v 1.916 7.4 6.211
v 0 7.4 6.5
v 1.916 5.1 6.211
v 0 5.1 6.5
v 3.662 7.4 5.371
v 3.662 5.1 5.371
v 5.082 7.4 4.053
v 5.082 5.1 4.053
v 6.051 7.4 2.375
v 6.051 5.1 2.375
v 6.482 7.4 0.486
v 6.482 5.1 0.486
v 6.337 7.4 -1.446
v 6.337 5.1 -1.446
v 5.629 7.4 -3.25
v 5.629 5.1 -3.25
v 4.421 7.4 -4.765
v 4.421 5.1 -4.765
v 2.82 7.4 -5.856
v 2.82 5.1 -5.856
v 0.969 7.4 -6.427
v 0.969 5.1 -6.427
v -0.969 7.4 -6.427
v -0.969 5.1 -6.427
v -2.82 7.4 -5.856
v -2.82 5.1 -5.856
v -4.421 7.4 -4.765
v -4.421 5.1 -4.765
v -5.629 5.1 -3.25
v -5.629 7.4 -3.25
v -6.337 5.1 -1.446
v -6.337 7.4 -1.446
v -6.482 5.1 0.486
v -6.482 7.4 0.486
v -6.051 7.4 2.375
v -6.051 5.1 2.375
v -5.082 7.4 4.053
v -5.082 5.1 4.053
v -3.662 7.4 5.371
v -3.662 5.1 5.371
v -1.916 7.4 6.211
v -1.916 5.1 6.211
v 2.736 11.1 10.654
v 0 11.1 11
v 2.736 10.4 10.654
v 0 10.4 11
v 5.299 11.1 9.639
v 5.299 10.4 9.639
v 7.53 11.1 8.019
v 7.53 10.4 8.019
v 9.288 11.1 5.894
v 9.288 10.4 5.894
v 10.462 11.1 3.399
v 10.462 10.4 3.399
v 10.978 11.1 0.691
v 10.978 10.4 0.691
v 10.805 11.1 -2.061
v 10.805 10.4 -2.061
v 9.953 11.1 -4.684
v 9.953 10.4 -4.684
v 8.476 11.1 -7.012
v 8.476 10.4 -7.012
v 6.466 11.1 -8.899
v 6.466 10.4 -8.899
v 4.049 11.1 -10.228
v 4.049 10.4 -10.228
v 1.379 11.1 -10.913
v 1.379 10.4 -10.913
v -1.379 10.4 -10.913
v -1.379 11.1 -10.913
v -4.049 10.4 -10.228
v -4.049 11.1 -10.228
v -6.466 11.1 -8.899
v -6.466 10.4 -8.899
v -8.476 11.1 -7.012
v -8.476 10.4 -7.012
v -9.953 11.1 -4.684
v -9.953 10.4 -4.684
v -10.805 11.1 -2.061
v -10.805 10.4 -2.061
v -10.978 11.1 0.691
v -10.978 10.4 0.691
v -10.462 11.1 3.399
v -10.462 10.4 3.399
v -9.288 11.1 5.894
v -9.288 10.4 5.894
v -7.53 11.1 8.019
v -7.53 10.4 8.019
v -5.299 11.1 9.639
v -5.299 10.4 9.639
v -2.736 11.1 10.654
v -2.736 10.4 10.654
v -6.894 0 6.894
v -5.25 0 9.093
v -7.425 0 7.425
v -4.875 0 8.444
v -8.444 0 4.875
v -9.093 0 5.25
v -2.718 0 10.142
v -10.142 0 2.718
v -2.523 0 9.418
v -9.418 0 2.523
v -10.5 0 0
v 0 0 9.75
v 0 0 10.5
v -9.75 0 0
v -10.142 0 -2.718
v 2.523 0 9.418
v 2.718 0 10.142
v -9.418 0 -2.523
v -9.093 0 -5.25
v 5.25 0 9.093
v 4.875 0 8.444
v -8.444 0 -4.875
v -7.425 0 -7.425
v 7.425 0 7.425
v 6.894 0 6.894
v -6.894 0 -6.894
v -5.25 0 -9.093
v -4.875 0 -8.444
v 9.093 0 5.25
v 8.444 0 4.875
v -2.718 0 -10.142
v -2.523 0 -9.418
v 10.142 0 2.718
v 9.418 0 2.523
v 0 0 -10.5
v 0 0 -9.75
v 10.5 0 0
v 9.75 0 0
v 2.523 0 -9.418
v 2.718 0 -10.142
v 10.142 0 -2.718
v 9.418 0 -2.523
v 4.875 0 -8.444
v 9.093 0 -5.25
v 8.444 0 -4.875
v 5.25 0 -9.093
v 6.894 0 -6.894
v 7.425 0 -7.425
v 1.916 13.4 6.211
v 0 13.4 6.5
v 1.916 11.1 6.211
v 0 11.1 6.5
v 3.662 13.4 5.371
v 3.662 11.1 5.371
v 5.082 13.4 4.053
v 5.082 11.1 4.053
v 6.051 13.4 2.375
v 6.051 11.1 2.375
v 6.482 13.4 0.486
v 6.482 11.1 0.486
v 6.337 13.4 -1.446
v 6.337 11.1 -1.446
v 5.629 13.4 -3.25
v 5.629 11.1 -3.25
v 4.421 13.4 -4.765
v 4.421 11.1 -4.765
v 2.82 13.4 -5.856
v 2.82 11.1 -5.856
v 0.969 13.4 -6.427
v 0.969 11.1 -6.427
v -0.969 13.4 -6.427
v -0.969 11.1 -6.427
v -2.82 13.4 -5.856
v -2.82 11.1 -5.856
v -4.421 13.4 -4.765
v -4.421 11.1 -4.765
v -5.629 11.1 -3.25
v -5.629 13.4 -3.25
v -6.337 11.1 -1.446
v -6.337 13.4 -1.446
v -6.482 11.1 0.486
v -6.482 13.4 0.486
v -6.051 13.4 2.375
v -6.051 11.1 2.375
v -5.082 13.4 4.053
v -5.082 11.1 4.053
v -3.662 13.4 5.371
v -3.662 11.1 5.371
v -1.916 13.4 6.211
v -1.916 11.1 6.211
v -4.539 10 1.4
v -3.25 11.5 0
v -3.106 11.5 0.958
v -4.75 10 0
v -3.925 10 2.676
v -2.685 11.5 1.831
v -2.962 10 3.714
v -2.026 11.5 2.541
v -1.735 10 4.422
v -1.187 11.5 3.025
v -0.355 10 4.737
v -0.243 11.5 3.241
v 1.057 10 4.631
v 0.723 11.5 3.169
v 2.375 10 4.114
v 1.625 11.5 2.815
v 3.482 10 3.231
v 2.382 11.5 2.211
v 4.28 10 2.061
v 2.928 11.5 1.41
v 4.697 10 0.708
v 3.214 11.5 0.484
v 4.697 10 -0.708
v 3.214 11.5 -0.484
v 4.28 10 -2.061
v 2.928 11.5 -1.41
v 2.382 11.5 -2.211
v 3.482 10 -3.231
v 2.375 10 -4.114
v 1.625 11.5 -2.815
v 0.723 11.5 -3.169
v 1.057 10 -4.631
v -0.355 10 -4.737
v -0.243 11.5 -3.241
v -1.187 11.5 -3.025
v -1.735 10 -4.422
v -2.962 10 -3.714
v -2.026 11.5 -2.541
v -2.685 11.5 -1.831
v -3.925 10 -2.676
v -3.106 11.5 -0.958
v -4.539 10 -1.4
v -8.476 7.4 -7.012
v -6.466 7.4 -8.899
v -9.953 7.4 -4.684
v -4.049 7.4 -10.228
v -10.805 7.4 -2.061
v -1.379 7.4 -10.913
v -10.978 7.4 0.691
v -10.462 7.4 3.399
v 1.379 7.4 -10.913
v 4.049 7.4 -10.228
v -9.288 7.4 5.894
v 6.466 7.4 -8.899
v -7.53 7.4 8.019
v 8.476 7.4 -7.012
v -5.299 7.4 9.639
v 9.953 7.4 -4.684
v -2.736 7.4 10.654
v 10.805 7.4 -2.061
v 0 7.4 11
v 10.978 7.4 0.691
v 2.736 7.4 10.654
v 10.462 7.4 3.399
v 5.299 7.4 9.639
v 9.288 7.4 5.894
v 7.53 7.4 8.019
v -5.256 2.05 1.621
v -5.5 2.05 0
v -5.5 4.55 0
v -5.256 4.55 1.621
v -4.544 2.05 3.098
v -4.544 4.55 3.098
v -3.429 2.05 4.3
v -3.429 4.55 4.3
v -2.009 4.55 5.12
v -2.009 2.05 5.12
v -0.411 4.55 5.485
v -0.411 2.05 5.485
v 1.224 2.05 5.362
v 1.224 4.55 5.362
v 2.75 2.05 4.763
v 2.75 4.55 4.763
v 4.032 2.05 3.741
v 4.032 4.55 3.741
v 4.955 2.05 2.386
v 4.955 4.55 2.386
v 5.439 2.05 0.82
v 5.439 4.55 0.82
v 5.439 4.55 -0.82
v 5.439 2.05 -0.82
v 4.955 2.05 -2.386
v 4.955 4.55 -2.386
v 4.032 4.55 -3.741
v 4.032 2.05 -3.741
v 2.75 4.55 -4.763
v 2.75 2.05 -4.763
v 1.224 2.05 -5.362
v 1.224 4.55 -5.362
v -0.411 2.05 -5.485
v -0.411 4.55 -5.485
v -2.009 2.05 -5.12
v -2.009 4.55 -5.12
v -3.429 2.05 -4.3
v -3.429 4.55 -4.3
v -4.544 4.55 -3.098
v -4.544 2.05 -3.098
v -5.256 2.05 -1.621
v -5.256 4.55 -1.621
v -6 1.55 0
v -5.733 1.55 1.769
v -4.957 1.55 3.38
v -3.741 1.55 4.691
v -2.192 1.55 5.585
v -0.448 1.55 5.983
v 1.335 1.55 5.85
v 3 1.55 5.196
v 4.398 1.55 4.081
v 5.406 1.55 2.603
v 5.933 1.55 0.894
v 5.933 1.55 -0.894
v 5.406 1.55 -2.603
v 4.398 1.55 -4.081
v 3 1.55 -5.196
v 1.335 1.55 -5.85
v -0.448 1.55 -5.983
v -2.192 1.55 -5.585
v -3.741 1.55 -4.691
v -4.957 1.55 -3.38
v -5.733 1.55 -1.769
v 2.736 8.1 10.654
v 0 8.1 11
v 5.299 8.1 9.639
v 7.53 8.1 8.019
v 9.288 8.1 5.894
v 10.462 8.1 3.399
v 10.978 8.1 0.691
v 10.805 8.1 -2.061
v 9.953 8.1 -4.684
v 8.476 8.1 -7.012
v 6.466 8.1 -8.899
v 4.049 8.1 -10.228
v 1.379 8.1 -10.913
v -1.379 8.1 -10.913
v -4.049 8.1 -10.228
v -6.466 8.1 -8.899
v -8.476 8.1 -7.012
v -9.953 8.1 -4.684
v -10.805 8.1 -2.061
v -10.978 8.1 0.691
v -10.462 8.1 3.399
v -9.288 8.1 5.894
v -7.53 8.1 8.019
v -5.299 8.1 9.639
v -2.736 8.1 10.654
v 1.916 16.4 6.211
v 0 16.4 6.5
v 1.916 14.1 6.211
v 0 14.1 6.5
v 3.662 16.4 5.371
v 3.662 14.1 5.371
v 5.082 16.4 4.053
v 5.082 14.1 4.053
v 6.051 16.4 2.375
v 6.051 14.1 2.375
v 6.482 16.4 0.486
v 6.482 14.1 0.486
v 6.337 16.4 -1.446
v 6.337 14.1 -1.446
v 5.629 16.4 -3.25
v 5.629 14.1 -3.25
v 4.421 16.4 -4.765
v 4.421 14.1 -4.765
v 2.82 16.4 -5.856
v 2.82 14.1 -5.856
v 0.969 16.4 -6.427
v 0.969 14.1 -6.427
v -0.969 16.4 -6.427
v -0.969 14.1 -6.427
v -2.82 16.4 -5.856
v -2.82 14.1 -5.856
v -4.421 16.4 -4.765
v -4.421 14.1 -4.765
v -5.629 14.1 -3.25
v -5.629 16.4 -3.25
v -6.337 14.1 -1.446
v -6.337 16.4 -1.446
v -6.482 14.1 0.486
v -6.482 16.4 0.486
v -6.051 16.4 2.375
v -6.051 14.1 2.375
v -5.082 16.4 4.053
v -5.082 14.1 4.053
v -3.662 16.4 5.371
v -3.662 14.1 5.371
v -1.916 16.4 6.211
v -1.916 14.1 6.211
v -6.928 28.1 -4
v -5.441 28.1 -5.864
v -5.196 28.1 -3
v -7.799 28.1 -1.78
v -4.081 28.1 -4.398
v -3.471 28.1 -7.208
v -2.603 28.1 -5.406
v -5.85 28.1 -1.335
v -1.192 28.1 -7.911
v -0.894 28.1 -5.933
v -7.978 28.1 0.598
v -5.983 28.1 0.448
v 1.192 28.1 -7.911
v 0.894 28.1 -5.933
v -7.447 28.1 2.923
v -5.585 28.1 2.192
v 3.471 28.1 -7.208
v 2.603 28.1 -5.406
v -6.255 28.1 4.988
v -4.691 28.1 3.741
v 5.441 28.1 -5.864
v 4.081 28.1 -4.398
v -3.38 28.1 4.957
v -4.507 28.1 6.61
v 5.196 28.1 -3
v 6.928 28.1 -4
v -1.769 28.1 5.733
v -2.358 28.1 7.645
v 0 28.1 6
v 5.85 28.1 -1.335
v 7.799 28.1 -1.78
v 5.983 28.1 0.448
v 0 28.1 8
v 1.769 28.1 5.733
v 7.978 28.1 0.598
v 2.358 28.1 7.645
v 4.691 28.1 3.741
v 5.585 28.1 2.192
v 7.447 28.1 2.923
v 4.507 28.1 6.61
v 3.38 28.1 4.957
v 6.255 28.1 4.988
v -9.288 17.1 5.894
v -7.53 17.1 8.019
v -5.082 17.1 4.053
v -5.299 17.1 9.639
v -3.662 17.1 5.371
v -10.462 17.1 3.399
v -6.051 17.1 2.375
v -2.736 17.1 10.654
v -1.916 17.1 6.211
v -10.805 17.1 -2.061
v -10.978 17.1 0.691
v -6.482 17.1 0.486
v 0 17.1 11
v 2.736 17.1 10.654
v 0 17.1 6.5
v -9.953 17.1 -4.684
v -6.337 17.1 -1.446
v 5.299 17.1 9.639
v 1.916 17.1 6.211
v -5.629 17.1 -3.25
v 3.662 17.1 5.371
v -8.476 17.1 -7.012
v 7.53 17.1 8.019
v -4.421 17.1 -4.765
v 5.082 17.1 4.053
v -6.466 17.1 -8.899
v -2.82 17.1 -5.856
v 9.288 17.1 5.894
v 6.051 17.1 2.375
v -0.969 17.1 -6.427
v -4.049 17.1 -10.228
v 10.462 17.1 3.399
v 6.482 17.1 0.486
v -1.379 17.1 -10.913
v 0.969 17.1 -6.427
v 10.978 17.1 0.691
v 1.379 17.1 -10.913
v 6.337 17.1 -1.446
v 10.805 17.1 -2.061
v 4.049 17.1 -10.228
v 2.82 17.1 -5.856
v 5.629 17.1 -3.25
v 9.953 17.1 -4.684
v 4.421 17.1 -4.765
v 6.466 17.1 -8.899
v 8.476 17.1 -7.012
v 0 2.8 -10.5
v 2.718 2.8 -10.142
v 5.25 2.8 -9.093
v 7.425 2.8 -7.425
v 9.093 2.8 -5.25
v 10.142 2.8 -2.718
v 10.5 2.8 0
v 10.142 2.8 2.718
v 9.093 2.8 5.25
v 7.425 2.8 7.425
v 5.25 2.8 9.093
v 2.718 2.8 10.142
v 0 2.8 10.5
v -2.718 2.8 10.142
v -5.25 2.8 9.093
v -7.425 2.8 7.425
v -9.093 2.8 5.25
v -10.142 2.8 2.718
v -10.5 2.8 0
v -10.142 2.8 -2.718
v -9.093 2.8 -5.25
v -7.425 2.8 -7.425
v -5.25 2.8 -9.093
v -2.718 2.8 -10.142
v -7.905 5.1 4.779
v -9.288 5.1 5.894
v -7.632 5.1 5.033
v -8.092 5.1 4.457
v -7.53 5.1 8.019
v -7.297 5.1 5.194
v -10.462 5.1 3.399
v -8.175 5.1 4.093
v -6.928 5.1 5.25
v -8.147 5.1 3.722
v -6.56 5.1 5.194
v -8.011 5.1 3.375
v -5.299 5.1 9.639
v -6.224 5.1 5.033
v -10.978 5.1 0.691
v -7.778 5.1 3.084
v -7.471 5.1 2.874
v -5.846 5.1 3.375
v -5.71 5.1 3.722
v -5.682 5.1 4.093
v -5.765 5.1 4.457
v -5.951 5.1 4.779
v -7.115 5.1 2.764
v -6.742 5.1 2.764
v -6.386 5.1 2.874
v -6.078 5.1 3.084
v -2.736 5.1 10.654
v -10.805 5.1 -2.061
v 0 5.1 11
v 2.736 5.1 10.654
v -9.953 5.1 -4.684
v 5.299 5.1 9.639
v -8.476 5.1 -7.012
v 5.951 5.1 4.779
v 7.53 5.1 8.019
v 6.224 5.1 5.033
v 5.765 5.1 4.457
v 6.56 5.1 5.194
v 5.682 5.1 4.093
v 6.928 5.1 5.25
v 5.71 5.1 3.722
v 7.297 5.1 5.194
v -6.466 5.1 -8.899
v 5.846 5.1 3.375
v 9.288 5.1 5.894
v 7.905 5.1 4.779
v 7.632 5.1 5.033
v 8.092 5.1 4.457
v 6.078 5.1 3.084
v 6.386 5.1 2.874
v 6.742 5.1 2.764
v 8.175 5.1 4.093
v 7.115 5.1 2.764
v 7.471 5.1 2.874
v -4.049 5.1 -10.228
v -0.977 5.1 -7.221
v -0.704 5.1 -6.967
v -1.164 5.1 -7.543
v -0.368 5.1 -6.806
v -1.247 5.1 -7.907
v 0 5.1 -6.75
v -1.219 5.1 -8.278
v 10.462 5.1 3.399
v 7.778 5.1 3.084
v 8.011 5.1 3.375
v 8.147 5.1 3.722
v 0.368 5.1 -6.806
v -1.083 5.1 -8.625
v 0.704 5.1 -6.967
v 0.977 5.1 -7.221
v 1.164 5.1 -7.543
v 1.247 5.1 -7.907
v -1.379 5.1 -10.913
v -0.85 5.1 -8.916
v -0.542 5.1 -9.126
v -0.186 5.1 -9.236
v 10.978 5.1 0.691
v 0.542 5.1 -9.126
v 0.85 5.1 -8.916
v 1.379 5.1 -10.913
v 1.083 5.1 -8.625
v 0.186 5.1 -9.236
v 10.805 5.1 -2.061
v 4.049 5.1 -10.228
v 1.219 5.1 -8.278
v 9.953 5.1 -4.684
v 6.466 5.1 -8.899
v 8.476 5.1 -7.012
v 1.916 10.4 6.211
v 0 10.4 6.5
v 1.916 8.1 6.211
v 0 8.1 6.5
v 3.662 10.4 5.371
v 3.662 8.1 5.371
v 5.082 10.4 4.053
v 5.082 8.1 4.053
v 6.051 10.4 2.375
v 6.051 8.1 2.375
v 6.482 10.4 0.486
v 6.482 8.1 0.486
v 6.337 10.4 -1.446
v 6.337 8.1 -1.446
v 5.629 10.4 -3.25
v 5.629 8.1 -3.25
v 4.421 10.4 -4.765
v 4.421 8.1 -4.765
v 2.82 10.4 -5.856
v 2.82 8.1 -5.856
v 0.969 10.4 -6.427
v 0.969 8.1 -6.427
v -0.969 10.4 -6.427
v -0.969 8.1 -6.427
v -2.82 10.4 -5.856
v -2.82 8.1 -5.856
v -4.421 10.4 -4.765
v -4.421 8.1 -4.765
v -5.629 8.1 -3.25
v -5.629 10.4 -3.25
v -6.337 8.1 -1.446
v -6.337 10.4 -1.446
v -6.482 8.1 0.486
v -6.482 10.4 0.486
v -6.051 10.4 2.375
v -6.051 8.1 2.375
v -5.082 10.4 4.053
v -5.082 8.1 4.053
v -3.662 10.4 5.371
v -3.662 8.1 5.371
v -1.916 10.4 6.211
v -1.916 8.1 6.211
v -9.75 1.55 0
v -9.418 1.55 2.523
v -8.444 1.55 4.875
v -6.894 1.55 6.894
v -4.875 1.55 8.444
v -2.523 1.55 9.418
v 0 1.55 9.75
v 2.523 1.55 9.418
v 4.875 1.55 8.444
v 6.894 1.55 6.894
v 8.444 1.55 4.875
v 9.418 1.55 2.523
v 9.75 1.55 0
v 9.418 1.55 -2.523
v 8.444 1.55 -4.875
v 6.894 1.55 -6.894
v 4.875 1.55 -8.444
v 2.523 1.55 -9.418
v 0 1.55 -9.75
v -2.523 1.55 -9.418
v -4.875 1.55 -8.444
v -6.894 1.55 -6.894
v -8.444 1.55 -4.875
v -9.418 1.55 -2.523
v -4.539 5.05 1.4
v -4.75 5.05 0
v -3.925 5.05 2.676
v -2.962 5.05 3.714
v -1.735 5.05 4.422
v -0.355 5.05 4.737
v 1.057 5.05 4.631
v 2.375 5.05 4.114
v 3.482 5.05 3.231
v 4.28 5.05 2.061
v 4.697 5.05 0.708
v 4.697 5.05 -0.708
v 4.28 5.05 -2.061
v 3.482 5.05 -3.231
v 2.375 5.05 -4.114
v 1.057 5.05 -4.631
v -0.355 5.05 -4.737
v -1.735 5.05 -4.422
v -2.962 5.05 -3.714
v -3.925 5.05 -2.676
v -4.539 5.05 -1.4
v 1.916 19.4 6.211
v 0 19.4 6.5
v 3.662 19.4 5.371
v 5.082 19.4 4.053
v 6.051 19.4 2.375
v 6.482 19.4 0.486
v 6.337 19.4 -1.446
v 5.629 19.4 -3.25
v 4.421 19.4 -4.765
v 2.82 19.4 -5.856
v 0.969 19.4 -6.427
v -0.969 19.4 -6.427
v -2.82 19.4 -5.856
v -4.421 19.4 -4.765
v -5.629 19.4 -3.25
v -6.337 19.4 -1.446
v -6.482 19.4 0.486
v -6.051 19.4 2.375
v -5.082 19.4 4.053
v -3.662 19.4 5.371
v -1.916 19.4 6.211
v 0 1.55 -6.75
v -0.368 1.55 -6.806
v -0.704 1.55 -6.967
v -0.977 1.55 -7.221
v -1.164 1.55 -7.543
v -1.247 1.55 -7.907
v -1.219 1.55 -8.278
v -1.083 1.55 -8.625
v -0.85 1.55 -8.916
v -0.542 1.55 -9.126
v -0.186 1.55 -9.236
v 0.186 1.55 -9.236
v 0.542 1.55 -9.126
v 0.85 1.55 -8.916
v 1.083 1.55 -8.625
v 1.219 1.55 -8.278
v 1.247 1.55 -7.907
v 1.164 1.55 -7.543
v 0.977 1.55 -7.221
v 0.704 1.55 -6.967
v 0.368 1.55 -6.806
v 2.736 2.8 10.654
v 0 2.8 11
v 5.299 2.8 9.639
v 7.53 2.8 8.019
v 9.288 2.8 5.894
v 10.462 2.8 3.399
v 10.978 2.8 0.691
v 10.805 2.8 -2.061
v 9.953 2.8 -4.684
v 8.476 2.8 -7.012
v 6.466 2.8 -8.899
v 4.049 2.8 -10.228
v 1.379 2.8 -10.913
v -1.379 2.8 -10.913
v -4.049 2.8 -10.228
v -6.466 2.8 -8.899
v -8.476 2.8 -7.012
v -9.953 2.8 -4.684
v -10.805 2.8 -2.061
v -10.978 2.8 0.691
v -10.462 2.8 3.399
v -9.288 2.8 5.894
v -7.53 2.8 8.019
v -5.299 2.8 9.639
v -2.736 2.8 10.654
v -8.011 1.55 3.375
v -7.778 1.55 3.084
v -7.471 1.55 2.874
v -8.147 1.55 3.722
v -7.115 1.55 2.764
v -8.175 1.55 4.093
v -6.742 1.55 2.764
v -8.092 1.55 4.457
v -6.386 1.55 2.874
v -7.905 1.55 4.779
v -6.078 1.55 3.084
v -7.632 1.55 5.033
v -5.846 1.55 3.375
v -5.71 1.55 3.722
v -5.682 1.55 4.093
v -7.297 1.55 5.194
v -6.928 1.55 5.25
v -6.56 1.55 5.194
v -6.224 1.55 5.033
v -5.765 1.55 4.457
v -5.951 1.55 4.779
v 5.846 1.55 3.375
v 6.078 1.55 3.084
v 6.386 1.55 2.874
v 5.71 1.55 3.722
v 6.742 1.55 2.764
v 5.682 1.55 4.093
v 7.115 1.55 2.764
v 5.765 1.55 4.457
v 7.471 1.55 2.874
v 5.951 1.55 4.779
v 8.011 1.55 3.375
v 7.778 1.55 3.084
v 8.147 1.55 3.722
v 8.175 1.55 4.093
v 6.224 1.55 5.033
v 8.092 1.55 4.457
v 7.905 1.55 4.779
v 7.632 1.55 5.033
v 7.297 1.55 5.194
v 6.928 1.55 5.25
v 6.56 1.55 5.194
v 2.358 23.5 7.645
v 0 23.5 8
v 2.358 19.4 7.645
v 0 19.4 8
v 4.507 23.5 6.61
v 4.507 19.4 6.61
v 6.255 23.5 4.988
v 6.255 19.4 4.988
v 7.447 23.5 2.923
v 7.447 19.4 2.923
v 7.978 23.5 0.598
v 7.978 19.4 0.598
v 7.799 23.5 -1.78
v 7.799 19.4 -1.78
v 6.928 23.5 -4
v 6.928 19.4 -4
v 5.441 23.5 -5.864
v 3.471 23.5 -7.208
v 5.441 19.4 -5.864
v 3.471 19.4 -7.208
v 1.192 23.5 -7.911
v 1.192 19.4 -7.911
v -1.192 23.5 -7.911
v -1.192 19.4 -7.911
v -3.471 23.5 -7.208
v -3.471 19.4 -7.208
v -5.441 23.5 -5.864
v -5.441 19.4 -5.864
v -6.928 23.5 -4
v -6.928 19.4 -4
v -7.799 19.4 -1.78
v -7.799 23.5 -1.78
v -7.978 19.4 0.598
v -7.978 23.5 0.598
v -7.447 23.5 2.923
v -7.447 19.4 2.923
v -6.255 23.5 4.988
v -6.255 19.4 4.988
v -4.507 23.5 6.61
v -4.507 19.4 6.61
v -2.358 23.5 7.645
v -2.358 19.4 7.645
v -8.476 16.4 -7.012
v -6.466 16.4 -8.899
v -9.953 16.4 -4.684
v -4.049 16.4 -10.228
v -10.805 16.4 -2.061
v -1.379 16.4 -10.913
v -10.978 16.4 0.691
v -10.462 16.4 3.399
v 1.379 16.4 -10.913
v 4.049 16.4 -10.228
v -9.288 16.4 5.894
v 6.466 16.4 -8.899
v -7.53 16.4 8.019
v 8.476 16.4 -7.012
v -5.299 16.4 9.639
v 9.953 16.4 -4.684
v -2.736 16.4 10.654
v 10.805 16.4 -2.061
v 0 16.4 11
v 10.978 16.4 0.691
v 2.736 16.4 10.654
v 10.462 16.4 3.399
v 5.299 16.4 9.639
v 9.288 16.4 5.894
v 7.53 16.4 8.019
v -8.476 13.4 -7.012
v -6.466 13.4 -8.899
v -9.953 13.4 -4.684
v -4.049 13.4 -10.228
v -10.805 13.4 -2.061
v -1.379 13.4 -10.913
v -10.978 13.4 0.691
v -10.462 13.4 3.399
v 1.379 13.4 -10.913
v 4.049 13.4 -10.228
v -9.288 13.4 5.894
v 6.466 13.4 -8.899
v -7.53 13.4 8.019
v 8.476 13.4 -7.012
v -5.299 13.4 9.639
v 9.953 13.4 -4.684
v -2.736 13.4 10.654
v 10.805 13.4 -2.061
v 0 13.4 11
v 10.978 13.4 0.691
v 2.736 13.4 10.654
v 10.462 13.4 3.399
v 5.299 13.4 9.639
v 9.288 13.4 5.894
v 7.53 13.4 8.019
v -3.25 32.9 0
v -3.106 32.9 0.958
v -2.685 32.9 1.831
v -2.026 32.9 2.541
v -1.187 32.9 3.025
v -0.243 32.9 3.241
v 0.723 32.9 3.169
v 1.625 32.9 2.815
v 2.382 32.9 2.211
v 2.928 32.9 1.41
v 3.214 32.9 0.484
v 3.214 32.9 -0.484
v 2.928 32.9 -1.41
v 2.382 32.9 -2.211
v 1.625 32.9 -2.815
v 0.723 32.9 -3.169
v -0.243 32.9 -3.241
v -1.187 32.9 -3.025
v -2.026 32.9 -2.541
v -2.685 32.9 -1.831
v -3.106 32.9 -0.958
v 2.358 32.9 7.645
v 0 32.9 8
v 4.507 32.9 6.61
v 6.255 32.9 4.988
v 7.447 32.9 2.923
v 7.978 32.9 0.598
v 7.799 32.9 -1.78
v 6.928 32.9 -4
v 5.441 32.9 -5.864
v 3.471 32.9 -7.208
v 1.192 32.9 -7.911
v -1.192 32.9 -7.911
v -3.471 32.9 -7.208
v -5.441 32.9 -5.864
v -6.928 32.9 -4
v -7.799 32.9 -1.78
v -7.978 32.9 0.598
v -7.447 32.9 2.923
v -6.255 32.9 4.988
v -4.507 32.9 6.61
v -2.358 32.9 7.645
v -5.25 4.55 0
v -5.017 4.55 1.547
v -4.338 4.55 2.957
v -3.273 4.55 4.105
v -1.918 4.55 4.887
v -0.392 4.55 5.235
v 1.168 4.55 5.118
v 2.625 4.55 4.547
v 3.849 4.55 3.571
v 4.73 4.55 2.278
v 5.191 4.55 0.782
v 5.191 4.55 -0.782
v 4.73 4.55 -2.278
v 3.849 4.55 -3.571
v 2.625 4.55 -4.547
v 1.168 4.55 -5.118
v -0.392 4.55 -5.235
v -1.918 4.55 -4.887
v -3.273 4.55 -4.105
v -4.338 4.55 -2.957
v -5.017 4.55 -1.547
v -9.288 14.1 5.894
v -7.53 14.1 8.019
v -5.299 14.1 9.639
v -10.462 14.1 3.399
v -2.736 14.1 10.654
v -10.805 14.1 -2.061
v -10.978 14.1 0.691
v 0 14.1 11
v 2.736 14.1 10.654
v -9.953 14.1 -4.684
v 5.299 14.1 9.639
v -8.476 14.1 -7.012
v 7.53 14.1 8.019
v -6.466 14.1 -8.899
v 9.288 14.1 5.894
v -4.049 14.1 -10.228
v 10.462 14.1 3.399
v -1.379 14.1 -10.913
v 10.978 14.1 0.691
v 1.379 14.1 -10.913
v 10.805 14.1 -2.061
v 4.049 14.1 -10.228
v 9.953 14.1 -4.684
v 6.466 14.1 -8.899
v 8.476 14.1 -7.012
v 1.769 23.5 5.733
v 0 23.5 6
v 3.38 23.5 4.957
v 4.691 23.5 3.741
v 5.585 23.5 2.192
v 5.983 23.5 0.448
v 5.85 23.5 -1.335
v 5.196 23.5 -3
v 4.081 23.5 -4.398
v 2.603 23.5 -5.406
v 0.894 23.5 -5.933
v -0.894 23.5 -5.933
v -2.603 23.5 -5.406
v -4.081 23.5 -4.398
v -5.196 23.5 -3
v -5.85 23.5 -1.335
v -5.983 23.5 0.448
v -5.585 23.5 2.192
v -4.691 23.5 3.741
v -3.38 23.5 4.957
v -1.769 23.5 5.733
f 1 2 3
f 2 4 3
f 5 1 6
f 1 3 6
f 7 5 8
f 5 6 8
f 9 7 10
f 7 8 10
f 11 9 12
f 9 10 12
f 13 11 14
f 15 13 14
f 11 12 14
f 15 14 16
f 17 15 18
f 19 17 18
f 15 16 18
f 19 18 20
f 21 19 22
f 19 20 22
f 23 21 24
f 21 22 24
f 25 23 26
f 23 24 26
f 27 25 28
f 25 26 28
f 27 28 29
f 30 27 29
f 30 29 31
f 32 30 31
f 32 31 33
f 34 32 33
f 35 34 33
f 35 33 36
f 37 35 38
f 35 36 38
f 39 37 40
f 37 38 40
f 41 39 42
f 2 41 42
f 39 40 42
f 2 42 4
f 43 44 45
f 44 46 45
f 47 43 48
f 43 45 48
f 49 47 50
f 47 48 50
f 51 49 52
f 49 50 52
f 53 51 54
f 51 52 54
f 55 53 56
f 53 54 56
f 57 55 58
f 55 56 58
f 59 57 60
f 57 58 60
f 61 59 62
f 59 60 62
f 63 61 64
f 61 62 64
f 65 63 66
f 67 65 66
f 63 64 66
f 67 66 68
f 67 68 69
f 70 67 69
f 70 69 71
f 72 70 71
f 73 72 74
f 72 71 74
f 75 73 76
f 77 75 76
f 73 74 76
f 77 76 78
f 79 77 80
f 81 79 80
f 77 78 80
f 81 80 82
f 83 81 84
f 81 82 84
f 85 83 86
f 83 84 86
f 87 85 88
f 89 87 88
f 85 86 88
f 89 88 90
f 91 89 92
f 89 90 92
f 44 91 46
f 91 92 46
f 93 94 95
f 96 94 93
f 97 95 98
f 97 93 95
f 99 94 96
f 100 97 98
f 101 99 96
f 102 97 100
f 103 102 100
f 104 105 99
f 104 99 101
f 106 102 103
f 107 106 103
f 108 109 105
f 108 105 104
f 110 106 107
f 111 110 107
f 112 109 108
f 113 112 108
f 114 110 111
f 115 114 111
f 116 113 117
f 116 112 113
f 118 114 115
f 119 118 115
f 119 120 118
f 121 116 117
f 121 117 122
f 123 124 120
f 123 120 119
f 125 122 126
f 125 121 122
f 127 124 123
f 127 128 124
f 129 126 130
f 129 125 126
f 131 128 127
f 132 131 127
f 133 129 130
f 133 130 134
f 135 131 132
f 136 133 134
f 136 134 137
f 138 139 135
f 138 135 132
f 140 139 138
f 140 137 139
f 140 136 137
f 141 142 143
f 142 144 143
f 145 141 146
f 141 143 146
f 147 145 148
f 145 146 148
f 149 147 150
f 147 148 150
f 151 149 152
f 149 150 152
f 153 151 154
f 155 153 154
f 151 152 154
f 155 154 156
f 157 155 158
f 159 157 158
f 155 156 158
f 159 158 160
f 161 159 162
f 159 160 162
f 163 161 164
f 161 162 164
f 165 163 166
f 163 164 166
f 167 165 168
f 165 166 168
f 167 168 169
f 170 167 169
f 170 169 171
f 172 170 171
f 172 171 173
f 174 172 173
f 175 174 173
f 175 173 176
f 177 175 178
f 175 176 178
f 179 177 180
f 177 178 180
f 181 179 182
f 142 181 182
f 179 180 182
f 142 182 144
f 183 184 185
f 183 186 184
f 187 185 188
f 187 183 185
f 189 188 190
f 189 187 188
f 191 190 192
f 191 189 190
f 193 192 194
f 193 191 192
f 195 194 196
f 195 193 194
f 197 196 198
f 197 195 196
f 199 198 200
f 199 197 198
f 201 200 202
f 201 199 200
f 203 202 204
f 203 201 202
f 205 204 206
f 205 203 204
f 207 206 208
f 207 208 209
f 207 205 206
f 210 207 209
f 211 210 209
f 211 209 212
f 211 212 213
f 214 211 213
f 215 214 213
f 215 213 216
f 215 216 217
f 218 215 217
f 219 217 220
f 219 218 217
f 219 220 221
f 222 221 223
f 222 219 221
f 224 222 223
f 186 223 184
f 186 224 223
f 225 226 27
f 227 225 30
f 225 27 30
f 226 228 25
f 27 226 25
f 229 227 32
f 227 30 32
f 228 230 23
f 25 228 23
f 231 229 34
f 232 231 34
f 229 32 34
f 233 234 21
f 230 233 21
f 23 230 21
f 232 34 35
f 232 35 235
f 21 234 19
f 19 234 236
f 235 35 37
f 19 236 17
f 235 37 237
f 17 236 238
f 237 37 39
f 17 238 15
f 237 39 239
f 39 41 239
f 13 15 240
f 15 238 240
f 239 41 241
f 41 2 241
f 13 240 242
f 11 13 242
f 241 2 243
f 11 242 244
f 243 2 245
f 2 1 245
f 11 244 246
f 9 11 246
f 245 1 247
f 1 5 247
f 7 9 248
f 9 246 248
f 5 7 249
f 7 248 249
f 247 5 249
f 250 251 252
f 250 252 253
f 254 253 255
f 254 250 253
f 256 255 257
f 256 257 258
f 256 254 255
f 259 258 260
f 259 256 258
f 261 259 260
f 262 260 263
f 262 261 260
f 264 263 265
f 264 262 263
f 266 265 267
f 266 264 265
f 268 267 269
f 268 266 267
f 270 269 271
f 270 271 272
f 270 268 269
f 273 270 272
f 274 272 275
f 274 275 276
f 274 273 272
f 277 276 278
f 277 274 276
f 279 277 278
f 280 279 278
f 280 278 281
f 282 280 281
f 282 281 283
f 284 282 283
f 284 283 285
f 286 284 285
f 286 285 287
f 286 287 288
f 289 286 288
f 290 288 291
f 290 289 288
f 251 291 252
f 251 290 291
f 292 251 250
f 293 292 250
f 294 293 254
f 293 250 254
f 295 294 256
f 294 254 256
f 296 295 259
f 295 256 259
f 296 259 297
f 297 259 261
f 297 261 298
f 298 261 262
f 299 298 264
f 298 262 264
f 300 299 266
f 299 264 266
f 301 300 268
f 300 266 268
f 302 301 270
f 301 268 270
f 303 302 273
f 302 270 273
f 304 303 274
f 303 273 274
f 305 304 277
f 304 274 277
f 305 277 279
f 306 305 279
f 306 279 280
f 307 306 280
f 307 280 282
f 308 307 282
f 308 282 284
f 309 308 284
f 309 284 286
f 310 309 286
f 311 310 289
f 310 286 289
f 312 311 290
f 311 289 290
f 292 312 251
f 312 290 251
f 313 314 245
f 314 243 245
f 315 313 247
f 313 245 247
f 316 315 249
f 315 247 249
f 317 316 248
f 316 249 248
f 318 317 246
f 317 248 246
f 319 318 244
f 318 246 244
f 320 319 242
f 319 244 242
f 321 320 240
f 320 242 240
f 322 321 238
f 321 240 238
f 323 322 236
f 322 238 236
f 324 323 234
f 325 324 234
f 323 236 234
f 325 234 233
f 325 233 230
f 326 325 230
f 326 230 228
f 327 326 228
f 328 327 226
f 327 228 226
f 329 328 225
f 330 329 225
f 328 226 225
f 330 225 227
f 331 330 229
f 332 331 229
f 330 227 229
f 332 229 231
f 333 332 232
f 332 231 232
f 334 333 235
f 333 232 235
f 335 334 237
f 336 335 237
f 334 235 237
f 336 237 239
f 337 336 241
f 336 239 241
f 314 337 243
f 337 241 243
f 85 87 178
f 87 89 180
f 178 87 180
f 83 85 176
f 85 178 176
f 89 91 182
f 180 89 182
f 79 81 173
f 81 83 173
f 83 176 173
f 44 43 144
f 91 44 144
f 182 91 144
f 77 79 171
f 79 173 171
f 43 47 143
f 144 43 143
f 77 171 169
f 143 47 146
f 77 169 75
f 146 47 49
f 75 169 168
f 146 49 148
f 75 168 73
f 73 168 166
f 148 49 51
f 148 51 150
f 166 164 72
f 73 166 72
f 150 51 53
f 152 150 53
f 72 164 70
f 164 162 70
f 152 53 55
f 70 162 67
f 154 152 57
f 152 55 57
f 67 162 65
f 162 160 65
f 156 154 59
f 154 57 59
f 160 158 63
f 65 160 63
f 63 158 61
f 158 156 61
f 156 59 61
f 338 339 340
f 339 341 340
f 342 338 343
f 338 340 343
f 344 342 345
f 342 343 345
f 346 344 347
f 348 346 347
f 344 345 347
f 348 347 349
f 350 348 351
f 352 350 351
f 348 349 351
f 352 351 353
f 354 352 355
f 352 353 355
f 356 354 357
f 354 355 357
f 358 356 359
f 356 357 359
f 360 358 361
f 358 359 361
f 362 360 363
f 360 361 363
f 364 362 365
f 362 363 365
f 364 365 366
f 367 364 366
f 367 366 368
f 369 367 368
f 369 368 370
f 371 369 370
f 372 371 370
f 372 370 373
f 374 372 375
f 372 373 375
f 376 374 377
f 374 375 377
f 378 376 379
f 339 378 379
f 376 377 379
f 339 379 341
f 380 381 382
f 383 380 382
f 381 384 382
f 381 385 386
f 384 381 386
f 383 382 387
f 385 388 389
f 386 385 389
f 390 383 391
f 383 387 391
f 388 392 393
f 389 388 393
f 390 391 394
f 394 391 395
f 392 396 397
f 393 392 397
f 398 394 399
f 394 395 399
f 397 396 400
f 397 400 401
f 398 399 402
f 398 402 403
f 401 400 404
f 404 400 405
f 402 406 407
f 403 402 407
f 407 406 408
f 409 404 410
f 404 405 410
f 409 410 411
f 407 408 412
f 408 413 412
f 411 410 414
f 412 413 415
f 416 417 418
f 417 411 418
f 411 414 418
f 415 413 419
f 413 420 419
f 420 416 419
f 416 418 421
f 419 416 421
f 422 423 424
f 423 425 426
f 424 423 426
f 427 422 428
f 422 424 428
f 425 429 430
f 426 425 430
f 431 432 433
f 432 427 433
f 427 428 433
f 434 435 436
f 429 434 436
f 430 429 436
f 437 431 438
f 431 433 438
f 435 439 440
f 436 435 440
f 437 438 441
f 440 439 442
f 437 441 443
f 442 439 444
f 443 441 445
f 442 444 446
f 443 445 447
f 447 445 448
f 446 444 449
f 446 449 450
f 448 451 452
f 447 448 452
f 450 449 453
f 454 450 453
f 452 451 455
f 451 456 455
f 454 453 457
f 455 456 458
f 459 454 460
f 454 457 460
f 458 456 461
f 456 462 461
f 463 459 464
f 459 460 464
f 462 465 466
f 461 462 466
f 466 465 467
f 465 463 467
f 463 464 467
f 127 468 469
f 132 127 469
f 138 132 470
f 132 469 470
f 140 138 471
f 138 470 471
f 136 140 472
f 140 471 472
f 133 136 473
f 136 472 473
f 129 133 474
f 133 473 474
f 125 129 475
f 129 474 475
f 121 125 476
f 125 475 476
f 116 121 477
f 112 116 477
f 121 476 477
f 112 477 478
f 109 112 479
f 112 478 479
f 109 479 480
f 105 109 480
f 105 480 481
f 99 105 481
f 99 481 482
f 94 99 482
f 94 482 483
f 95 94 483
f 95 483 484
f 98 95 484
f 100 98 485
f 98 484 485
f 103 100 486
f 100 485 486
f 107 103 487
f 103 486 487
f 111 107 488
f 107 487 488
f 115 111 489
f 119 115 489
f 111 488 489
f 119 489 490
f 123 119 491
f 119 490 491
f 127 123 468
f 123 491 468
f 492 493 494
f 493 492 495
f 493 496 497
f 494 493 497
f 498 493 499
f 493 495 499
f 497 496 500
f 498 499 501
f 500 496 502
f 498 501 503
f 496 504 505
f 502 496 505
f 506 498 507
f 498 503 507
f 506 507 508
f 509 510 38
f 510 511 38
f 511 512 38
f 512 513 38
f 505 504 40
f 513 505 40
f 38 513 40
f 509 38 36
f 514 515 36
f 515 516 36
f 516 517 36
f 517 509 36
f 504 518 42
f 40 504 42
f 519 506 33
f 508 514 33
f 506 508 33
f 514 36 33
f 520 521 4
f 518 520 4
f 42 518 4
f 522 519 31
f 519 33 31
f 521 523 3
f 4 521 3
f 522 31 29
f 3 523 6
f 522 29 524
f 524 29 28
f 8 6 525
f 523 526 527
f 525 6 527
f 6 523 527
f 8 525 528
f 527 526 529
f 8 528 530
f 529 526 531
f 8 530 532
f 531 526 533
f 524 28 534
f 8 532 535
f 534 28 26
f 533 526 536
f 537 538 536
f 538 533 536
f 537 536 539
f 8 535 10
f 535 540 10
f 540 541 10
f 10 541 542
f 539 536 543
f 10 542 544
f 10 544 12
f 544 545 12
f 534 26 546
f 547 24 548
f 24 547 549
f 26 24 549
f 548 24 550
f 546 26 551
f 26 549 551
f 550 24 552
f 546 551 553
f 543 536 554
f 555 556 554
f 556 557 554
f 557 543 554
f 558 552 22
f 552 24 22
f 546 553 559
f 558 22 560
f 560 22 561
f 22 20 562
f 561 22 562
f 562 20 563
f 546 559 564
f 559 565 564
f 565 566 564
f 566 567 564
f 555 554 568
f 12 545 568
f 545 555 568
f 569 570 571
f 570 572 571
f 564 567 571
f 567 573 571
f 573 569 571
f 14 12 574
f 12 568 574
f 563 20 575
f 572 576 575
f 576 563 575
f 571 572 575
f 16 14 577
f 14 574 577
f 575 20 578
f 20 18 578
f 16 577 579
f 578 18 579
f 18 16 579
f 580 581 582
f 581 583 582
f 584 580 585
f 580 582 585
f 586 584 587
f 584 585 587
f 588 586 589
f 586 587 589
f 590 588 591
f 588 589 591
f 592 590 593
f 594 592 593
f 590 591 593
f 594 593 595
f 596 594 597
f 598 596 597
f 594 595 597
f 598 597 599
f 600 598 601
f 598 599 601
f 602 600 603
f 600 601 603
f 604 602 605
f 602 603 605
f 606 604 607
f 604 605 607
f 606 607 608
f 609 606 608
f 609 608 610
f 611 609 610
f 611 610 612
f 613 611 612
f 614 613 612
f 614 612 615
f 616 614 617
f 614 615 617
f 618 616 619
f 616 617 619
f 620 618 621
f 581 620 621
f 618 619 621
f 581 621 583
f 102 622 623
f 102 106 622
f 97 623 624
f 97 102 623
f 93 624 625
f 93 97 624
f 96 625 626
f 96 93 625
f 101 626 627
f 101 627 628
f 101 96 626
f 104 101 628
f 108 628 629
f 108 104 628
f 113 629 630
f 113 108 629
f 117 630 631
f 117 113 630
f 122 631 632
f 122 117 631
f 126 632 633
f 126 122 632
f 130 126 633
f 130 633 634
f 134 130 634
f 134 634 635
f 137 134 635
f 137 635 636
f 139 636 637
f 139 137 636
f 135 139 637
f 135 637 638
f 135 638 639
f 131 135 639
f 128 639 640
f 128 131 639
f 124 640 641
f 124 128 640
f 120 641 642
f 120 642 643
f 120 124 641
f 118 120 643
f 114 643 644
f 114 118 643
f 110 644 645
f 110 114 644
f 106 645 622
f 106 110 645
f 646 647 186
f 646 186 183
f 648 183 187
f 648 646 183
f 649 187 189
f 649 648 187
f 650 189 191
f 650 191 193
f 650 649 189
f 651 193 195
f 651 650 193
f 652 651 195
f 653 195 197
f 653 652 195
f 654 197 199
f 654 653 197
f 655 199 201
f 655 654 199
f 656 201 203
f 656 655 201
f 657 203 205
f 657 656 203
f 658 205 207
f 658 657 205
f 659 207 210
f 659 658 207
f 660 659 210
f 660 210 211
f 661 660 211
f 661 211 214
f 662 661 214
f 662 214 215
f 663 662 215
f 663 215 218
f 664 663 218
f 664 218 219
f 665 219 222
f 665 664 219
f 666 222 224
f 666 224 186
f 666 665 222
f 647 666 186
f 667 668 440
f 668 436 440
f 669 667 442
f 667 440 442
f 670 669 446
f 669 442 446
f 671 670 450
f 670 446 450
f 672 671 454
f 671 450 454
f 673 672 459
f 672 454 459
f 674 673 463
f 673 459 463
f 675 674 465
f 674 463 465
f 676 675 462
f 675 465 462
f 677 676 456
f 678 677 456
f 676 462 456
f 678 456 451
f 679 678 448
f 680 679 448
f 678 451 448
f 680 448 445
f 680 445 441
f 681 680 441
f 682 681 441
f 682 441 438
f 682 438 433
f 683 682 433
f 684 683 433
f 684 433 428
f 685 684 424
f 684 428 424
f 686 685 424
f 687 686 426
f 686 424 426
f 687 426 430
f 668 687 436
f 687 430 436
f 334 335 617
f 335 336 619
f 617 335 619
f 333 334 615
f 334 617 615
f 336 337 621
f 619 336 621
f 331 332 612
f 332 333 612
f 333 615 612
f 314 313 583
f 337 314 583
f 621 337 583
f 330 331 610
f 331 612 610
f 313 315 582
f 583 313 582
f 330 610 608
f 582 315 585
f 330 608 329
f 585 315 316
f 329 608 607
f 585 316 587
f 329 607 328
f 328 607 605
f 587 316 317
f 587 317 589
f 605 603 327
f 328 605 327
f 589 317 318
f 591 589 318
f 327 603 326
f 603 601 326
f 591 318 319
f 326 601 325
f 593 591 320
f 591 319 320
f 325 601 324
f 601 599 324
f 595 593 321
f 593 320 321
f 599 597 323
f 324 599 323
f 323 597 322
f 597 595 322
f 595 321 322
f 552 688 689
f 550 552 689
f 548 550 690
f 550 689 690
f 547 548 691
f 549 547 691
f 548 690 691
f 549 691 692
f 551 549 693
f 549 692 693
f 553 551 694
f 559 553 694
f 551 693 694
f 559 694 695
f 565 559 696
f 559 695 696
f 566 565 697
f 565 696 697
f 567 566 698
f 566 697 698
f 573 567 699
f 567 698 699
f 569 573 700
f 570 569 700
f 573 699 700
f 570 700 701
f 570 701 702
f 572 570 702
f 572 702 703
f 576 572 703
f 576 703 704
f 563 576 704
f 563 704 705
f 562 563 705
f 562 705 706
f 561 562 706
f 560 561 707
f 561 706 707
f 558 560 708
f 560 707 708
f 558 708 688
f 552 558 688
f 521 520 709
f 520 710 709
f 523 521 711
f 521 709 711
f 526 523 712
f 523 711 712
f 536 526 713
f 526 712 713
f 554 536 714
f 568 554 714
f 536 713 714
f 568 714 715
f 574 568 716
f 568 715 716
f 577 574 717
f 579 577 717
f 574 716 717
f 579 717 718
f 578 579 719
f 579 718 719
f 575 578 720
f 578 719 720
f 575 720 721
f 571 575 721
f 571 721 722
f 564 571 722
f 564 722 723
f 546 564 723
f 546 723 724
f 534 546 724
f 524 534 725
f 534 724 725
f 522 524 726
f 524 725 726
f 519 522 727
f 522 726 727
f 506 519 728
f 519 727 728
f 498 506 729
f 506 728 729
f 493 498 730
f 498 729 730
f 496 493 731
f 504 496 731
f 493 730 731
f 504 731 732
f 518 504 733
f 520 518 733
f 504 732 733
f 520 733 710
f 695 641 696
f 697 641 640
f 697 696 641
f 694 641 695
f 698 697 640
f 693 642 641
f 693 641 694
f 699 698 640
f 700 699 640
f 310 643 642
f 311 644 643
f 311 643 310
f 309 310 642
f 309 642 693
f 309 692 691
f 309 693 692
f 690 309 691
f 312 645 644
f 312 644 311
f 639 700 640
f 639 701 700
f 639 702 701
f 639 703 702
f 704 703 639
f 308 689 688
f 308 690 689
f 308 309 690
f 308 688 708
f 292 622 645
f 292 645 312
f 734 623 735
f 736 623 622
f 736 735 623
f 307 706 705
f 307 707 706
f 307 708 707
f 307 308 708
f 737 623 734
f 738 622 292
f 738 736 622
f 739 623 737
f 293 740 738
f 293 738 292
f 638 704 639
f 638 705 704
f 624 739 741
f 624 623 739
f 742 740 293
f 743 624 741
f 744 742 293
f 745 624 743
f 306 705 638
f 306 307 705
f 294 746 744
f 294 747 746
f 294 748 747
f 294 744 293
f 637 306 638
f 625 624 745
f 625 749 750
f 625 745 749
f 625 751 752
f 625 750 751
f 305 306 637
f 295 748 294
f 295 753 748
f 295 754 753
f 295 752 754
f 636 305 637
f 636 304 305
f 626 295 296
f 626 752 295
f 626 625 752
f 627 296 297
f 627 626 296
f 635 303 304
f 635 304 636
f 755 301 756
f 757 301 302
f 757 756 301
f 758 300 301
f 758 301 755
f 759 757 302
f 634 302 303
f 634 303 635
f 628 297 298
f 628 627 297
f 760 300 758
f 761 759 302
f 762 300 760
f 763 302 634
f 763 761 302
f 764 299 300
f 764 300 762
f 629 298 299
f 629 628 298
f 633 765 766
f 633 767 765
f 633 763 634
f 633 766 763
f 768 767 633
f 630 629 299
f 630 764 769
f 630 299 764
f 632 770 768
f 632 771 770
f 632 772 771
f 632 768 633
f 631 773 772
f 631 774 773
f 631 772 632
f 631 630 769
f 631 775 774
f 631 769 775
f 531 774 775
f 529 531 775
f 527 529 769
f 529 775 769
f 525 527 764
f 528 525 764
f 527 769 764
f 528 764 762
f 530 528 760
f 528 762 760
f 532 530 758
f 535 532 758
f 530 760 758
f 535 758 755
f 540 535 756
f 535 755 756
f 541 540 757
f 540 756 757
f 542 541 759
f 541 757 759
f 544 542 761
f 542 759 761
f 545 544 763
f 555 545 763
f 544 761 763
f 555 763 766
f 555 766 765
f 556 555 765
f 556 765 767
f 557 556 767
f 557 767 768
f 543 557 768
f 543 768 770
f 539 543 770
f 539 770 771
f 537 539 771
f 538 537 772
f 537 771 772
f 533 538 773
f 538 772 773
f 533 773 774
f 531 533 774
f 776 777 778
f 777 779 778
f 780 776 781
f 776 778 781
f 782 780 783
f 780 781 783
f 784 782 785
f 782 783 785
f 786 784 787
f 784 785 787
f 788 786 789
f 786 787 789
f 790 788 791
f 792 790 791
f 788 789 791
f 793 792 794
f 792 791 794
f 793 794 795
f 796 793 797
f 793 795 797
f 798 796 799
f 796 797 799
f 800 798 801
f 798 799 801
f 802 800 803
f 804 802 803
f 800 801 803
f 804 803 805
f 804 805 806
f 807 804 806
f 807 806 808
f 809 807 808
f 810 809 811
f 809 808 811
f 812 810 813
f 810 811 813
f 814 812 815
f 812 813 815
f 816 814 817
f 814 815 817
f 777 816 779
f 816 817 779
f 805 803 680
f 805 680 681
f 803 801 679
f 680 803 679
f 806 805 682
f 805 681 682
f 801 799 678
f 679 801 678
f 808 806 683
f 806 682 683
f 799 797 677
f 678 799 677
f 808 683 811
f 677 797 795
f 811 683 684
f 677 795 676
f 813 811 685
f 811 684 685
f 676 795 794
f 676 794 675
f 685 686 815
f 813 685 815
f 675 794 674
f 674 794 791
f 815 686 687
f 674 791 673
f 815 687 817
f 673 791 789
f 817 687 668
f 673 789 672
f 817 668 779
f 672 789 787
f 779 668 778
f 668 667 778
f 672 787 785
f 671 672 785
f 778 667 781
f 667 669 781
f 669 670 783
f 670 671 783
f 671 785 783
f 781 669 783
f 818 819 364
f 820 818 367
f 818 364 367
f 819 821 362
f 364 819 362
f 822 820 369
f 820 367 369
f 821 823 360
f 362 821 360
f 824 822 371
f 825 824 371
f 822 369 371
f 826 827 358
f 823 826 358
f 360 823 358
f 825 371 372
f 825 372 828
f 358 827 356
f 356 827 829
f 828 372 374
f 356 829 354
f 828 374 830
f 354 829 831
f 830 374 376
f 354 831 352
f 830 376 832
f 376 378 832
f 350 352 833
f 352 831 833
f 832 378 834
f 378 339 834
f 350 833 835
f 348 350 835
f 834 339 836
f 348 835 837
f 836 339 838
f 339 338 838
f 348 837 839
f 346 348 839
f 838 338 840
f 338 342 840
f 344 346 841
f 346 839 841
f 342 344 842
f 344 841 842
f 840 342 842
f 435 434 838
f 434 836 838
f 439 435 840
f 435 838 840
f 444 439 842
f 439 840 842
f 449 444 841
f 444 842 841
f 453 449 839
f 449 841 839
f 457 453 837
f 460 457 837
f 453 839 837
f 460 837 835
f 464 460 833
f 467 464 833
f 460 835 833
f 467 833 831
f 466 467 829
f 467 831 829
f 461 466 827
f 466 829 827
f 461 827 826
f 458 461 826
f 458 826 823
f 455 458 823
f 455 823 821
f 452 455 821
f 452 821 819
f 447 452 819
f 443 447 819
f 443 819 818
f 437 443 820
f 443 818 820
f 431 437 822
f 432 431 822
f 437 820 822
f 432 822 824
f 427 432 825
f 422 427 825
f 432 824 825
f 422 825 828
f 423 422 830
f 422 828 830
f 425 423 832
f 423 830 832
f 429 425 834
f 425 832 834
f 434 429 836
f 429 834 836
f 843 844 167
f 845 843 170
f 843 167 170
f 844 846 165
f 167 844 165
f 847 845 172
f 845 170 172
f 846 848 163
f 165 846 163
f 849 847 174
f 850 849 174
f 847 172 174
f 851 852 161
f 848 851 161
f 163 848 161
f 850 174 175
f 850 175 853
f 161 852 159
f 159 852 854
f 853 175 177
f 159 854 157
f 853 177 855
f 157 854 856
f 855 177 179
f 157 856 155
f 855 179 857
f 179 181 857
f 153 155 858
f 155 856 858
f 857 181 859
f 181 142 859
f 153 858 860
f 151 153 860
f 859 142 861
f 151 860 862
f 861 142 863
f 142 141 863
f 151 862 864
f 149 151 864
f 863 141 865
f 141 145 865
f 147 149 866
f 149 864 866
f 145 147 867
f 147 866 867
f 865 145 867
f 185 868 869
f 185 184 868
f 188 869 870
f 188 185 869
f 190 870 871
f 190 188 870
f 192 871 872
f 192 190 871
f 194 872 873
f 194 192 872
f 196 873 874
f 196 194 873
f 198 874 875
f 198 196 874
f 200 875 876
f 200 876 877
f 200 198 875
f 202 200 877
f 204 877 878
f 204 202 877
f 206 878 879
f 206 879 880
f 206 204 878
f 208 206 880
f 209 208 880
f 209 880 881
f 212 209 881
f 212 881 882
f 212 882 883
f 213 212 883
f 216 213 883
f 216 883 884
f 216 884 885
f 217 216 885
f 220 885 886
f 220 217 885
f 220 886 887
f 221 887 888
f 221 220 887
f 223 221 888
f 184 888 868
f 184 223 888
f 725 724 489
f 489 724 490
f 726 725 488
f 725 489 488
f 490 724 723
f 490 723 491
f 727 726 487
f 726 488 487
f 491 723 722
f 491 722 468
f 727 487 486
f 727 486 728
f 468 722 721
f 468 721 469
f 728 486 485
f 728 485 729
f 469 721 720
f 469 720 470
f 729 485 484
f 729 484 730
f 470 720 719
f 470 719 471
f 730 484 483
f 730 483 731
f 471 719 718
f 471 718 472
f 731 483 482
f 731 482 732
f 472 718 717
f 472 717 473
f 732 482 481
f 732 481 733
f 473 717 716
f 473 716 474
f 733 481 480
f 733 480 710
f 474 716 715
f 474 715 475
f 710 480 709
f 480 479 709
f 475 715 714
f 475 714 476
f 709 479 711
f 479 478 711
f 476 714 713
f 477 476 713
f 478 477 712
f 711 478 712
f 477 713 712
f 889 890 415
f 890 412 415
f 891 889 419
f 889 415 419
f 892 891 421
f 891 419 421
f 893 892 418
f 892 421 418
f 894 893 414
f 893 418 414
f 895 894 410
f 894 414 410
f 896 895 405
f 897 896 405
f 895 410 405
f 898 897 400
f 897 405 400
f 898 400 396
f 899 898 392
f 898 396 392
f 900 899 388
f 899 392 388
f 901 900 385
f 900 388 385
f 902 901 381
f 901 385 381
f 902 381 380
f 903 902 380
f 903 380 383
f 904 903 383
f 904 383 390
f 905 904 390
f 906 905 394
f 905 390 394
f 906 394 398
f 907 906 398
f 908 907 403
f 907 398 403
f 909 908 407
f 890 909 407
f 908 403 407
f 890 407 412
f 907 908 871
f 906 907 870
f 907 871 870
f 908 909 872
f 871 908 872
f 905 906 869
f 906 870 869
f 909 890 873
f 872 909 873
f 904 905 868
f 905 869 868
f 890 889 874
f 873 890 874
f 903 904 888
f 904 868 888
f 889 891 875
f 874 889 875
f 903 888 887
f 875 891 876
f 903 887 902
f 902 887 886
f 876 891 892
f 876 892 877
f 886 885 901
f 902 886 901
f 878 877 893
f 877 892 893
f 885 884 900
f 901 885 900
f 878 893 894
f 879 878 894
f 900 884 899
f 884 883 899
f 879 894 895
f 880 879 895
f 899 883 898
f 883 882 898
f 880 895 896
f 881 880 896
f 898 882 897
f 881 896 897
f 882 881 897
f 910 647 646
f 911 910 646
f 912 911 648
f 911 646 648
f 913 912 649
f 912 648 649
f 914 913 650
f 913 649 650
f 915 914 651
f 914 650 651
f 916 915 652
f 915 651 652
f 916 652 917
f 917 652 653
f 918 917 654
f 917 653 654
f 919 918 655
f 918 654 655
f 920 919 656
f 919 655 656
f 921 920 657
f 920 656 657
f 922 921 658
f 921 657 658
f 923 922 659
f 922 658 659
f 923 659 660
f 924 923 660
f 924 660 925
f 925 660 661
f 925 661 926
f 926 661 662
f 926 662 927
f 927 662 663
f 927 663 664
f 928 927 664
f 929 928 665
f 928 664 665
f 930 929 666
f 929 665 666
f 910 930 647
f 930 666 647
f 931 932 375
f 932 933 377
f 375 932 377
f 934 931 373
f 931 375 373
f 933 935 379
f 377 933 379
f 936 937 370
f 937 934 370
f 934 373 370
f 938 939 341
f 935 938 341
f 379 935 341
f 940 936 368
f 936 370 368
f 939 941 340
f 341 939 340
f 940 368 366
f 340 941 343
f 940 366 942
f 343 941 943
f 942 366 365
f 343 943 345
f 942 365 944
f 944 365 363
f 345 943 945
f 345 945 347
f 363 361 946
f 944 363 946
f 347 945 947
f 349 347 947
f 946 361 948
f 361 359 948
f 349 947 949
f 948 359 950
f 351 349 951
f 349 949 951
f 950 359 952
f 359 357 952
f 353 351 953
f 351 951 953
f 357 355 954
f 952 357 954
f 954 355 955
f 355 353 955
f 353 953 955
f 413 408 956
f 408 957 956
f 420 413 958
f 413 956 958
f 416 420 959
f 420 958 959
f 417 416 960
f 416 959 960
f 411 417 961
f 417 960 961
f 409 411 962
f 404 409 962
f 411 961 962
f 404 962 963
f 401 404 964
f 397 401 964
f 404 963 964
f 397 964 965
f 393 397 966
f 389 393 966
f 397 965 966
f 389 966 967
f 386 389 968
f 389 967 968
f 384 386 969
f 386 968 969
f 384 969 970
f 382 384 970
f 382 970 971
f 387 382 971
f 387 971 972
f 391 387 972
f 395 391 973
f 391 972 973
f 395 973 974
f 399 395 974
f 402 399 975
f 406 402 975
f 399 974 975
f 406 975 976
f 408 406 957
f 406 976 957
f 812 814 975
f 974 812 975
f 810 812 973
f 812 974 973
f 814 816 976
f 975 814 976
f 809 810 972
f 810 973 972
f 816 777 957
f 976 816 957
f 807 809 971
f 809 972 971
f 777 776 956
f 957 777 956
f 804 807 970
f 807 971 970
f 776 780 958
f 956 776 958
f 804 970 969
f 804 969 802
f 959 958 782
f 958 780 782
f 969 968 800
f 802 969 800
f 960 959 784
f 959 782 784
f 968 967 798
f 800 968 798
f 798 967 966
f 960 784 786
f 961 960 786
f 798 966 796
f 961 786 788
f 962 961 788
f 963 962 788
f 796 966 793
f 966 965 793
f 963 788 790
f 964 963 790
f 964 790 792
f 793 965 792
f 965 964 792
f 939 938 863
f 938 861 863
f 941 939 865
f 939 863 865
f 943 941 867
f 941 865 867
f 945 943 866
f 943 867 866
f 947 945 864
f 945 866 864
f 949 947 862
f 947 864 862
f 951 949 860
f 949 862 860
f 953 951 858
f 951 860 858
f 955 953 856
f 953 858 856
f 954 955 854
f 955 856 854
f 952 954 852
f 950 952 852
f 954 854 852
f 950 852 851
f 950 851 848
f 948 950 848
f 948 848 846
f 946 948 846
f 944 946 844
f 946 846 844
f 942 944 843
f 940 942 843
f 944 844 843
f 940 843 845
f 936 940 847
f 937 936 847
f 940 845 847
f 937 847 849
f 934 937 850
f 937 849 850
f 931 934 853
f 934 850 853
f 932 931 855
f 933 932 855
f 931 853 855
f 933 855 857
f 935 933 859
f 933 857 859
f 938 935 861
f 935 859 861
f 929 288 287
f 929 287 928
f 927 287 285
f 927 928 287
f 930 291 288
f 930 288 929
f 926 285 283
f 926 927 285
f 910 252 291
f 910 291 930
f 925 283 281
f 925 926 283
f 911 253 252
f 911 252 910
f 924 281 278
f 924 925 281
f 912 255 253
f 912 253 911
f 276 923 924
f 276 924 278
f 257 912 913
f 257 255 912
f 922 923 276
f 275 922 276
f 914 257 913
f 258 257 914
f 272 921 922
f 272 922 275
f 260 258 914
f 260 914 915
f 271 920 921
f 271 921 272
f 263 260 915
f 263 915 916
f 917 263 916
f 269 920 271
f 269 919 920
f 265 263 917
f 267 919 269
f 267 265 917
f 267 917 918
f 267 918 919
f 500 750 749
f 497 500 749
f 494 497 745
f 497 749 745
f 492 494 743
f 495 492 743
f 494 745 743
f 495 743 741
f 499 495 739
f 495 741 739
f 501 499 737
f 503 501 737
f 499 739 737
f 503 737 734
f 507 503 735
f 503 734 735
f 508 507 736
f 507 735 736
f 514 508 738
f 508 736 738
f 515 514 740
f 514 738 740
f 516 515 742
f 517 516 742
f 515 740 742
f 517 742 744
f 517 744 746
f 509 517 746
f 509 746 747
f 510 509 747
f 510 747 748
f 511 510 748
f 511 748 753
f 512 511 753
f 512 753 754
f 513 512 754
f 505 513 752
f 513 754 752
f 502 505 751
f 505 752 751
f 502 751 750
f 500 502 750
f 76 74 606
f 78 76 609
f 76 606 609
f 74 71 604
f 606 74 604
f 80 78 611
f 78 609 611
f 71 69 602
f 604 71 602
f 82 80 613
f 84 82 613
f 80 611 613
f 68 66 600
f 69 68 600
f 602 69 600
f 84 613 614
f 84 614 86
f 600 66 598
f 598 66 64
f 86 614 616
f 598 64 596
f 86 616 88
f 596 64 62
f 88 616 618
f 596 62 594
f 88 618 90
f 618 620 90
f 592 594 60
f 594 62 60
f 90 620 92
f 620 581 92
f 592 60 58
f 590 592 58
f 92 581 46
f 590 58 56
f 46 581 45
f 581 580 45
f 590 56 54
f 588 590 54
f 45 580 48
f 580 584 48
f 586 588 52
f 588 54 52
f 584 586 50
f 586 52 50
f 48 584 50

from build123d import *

# Parameters (mm, degrees)
SKETCH2_R                           = 10.5
BOSS_EXTRUDE1_DEPTH                 = 2.8
SKETCH4_W                           = 1.25
SKETCH4_H                           = 5.1
F_2_5_2_5_DIAMETER_HOLE1_AT_2_COUNT = 2
F_2_5_2_5_DIAMETER_HOLE1_AT_2_PITCH = 13.856406461
F_2_5_2_5_DIAMETER_HOLE1_AT_3_COUNT = 2
F_2_5_2_5_DIAMETER_HOLE1_AT_3_PITCH = 13.856406461
CHAMFER1_SIZE                       = 0.5


with BuildPart() as part:
    # Sketch1 → Revolve1 (revolve)
    with BuildSketch(Plane(origin=(0, 0, 0), x_dir=(-1, 0, 0), z_dir=(0, 0, -1)), mode=Mode.PRIVATE) as revolve1_sk:
        Polygon((-11, 2.8), (0, 2.8), (0, 32.9), (-8, 32.9), (-8, 28.1), (-6, 28.1), (-6, 23.5), (-8, 23.5), (-8, 19.4), (-6.5, 19.4), (-6.5, 17.1), (-11, 17.1), (-11, 16.4), (-6.5, 16.4), (-6.5, 14.1), (-11, 14.1), (-11, 13.4), (-6.5, 13.4), (-6.5, 11.1), (-11, 11.1), (-11, 10.4), (-6.5, 10.4), (-6.5, 8.1), (-11, 8.1), (-11, 7.4), (-6.5, 7.4), (-6.5, 5.1), (-11, 5.1), align=None)
    revolve(revolve1_sk.sketch.rotate(Axis((0, 2.8, 0), (0, 1, 0)), 270), axis=Axis((0, 2.8, 0), (0, 1, 0)))

    # Sketch2 → Boss-Extrude1 (add)
    with BuildSketch(Plane.XZ.offset(-2.8)):
        with Locations(Location((0, 0, 0), (0, 0, 270))):
            Circle(SKETCH2_R)
    extrude(amount=BOSS_EXTRUDE1_DEPTH)

    # Sketch3 → Cut-Revolve1 (revolve, cut)
    with BuildSketch(Plane(origin=(0, 0, 0), x_dir=(-1, 0, 0), z_dir=(0, 0, -1)), mode=Mode.PRIVATE) as cut_revolve1_sk:
        Polygon((-9.75, 0), (0, 0), (0, 32.9), (-3.25, 32.9), (-3.25, 11.5), (-4.75, 10), (-4.75, 4.55), (-5.5, 4.55), (-5.5, 1.55), (-9.75, 1.55), align=None)
    revolve(cut_revolve1_sk.sketch.rotate(Axis((0, 0, 0), (0, 1, 0)), 180), axis=Axis((0, 0, 0), (0, 1, 0)), mode=Mode.SUBTRACT)

    # Sketch4 → Ø2.5 (2.5) Diameter Hole1 (revolve, cut)
    with BuildSketch(Plane(origin=(-6.92820323, 5.1, 4), x_dir=(0, 0, 1), z_dir=(1, 0, 0))):
        with Locations((0.625, 2.55)):
            Rectangle(SKETCH4_W, SKETCH4_H)
    f_2_5_2_5_diameter_hole1 = revolve(axis=Axis((-6.92820323, 11.45, 4), (0, -1, 0)), mode=Mode.SUBTRACT)

    # Ø2.5 (2.5) Diameter Hole1 at 2: Ø2.5 (2.5) Diameter Hole1 ×2
    with Locations(*[Vector(0.5000000000000001, 0, -0.8660254037844387) * (i * F_2_5_2_5_DIAMETER_HOLE1_AT_2_PITCH) for i in range(1, F_2_5_2_5_DIAMETER_HOLE1_AT_2_COUNT)]):
        add(f_2_5_2_5_diameter_hole1, mode=Mode.SUBTRACT)

    # Ø2.5 (2.5) Diameter Hole1 at 3: Ø2.5 (2.5) Diameter Hole1 ×2
    with Locations(*[(i * F_2_5_2_5_DIAMETER_HOLE1_AT_3_PITCH, 0, 0) for i in range(1, F_2_5_2_5_DIAMETER_HOLE1_AT_3_COUNT)]):
        add(f_2_5_2_5_diameter_hole1, mode=Mode.SUBTRACT)

    # Chamfer1
    chamfer1_edges = [part.edges().sort_by_distance(p)[0] for p in [
        (4.75, 4.55, 0),
        (5.5, 1.55, 0),
    ]]
    chamfer(chamfer1_edges, length=CHAMFER1_SIZE)


solid = part.part
